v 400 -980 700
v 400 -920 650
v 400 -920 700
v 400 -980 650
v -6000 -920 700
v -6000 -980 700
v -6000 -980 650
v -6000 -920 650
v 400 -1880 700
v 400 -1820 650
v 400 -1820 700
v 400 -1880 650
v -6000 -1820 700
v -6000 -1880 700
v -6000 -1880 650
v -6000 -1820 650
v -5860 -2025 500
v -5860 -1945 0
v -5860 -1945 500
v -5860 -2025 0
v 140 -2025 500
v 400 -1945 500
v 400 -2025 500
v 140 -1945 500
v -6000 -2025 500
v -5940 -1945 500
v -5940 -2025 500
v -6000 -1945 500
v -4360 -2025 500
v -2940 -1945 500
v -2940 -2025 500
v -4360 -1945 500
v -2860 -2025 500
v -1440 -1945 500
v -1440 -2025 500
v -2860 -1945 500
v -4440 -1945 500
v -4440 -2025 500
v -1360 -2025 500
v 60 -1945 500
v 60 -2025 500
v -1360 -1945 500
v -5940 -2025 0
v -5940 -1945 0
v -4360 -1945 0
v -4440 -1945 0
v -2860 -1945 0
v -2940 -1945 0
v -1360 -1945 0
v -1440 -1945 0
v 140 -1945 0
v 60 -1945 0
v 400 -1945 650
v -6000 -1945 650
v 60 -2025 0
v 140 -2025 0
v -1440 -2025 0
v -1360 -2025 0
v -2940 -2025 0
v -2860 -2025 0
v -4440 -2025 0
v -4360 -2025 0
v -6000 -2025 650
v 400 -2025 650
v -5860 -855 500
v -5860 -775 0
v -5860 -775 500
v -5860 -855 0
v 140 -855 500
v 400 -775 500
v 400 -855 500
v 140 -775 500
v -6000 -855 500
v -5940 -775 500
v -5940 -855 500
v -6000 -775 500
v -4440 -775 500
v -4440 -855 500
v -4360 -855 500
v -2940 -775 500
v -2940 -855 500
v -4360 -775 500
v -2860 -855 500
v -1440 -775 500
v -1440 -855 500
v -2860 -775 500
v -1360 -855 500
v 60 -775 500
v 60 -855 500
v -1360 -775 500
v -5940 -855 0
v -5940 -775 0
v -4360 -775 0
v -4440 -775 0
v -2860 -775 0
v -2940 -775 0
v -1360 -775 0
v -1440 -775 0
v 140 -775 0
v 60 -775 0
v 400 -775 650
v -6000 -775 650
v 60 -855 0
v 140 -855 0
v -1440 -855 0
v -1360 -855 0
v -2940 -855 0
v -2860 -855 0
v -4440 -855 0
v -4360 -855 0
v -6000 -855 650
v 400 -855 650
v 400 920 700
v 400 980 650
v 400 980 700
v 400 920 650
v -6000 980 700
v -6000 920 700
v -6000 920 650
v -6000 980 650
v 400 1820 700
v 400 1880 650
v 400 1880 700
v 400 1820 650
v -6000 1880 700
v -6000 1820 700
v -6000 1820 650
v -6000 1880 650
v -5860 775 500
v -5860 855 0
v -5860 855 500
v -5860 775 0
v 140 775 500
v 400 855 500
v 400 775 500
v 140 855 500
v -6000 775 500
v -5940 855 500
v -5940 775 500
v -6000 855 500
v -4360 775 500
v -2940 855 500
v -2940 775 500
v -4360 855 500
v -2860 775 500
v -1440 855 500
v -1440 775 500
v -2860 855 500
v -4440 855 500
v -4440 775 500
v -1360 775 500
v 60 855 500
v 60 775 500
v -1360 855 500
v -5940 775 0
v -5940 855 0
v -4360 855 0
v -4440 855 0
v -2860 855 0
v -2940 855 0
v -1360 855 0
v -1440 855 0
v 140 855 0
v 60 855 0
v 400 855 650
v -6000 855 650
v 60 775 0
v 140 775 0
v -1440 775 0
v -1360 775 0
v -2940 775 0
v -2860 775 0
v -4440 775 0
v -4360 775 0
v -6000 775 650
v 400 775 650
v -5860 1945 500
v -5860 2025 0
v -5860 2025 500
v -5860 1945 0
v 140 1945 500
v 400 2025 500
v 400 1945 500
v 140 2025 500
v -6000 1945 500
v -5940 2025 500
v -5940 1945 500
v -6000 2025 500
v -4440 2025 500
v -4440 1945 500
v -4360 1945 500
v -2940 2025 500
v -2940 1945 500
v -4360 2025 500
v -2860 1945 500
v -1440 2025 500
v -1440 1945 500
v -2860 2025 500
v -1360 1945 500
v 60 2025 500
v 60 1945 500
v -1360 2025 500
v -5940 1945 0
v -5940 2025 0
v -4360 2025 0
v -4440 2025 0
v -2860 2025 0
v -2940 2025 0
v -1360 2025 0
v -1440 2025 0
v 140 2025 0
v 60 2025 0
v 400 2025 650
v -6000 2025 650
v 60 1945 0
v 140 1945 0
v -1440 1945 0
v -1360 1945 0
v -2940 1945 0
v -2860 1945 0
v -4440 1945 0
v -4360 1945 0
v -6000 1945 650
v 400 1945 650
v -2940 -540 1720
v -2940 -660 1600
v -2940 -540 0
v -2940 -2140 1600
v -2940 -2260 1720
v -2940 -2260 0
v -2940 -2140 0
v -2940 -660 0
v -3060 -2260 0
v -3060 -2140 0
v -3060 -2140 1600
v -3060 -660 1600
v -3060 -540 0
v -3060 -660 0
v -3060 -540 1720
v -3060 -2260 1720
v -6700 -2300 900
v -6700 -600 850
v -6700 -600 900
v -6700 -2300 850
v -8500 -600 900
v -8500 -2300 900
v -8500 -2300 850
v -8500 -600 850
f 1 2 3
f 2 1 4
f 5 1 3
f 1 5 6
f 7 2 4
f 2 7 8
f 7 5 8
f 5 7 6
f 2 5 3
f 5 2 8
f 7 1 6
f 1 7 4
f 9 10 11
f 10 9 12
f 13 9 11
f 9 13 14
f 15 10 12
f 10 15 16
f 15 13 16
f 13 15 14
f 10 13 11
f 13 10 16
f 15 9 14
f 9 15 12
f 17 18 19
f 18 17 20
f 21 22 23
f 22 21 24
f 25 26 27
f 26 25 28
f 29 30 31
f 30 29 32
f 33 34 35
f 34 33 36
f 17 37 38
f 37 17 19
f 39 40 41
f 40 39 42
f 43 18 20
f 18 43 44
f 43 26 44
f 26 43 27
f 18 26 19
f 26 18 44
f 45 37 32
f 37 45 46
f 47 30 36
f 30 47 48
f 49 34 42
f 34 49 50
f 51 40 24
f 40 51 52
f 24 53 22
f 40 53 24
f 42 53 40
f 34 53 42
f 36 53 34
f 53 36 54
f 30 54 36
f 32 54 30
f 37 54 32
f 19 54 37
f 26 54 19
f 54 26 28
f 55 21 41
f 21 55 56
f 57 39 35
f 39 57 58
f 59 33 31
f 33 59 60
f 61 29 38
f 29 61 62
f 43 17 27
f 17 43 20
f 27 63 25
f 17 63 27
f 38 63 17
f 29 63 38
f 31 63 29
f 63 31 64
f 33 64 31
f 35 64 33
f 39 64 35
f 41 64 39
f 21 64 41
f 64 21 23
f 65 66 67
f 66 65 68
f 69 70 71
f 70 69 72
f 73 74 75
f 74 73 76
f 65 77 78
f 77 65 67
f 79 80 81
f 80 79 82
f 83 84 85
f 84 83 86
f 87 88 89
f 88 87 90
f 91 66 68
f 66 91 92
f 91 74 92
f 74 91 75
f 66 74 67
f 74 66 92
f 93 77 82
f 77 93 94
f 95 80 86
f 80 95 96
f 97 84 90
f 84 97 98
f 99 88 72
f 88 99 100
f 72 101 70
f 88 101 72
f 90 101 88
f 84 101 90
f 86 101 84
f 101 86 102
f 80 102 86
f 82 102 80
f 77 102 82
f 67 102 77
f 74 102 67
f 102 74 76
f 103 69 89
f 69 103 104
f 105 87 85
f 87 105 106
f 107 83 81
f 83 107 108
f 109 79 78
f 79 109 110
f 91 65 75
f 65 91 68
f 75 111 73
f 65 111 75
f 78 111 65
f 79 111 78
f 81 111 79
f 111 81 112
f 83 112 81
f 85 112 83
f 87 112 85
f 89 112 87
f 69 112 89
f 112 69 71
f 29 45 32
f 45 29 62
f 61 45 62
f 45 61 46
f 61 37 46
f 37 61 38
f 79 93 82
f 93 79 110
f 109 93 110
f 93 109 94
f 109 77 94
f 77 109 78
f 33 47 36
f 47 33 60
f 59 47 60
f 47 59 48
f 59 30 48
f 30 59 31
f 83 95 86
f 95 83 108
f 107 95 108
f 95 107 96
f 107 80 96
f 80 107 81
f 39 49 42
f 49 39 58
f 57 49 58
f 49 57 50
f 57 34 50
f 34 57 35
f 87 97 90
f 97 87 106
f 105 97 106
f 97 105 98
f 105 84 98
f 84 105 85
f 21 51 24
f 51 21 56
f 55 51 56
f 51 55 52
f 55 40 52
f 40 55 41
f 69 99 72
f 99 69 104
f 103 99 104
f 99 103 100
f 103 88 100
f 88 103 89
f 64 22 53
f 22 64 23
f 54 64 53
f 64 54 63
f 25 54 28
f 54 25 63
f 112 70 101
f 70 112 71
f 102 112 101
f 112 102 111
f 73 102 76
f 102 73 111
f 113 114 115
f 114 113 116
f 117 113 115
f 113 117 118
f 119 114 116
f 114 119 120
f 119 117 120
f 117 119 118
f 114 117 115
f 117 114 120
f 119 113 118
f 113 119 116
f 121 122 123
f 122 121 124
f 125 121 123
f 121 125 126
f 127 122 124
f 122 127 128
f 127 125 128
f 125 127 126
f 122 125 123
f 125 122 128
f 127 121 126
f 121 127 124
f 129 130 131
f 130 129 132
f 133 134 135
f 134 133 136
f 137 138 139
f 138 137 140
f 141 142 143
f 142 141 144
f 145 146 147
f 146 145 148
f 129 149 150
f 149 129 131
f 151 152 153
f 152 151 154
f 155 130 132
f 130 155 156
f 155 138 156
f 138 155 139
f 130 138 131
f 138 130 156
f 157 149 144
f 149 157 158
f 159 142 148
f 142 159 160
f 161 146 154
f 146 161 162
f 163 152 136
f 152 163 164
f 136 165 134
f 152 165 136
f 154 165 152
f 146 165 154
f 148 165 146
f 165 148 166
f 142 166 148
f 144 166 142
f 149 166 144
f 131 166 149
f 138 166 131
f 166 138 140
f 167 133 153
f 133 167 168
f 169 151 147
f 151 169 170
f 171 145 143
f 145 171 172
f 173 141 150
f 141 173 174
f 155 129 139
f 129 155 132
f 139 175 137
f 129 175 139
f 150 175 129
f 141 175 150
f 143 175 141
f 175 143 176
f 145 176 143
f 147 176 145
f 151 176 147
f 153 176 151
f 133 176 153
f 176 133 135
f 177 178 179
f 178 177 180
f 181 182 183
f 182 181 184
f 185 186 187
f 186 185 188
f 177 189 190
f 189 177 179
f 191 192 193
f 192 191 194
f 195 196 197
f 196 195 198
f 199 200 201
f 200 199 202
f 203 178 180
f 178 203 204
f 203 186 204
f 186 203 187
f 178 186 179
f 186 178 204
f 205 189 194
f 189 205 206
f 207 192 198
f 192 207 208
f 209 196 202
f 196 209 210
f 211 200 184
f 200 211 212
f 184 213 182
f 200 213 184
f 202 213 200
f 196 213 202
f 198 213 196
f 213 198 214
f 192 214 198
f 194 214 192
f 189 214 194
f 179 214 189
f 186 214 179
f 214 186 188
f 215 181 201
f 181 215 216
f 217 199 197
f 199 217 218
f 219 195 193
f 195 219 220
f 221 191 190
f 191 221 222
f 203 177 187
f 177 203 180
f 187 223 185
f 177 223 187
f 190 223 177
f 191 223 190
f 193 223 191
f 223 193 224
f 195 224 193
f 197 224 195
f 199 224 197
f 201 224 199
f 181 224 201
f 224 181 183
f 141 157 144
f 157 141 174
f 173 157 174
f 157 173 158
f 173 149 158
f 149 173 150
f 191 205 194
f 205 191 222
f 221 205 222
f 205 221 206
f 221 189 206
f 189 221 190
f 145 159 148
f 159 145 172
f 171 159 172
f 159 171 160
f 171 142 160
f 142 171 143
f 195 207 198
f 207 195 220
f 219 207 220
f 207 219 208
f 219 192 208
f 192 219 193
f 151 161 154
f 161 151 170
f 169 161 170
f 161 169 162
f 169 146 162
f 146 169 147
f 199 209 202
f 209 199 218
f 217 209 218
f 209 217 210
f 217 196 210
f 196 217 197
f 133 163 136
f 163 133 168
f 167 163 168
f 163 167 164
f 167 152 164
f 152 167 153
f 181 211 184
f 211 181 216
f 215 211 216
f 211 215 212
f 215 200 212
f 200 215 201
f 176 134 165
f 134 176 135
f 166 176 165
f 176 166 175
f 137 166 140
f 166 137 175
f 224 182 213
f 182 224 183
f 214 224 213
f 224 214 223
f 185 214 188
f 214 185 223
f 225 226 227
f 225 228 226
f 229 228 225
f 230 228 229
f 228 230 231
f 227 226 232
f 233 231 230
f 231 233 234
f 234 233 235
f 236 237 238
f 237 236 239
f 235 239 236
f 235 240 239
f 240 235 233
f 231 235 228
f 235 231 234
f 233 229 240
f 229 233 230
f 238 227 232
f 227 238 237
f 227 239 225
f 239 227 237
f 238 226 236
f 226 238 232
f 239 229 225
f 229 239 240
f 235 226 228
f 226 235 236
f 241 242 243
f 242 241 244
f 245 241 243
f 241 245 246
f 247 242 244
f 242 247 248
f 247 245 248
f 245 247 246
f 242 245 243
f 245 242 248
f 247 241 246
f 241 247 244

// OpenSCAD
// I/O: infeed / outfeed chain conveyors, contour gate, pick station - generated by asrs_3d.py from out/design_result.json (F3) - units mm
// DESIGN - to be checked and released by the responsible engineer. Coordinates: x along aisle, y across, z up.

bays = 19;
levels = 10;
bay = 1925;
L_rack = 36675;
H_rack = 12600;
W_rack = 4100;
clear_beam = 1825;
z1 = 450;
pitch = 1250;
up_w = 100;
up_d = 80;
gap = 75;
aisle = 1500;
x0 = 1200;
y_face = 750;
y_rear = 2050;
y_crate_c = 1400;
cL = 1200;
cW = 800;
cH = 600;
c_leg = 160;
beam_h = 120;
beam_b = 50;
mast_h = 600;
mast_b = 400;
mast_t = 6;
H_mast = 13100;
wheel_D = 400;
wheelbase = 2400;
stroke = 1350;
drum_D = 315;
conv_top = 700;
fork_len = 1300;
rail_top_z0 = 13130;
rail_top_z1 = 13250;
tie_z0 = 13250;
tie_z1 = 13350;
fork_w = [450, 400, 350];  fork_t = [60, 45, 35];
function lz(l) = z1 + (l - 1) * pitch;     // beam top of level l
function cx(b, k) = x0 + b * bay + up_w + gap + cW / 2 + k * (cW + gap);
module box(a, b) { translate(a) cube([b[0]-a[0], b[1]-a[1], b[2]-a[2]]); }
module brace(a, b, w=40) { hull() { translate(a - [w/2, w/2, w/2]) cube(w); translate(b - [w/2, w/2, w/2]) cube(w); } }

module conveyor(s) { yc = y_crate_c; lo = min(s*(yc-625), s*(yc+625)); hi = max(s*(yc-625), s*(yc+625));
  box([-6000, lo, conv_top - 200], [400, lo + 80, conv_top - 50]); box([-6000, hi - 80, conv_top - 200], [400, hi, conv_top - 50]);
  for (yy = [s*(yc-450), s*(yc+450)]) box([-6000, yy - 30, conv_top - 50], [400, yy + 30, conv_top]);
  for (x = [-5900 : 1500 : 400], yy = [lo + 40, hi - 40]) box([x - 40, yy - 40, 0], [x + 40, yy + 40, conv_top - 200]); }
conveyor(-1); conveyor(1);
for (yy = [-(y_crate_c + 800), -(y_crate_c - 800)]) box([-3060, yy - 60, 0], [-2940, yy + 60, 1700]);
box([-3060, -(y_crate_c + 860), 1600], [-2940, -(y_crate_c - 860), 1720]);
box([-8500, -2300, 850], [-6700, -600, 900]);
